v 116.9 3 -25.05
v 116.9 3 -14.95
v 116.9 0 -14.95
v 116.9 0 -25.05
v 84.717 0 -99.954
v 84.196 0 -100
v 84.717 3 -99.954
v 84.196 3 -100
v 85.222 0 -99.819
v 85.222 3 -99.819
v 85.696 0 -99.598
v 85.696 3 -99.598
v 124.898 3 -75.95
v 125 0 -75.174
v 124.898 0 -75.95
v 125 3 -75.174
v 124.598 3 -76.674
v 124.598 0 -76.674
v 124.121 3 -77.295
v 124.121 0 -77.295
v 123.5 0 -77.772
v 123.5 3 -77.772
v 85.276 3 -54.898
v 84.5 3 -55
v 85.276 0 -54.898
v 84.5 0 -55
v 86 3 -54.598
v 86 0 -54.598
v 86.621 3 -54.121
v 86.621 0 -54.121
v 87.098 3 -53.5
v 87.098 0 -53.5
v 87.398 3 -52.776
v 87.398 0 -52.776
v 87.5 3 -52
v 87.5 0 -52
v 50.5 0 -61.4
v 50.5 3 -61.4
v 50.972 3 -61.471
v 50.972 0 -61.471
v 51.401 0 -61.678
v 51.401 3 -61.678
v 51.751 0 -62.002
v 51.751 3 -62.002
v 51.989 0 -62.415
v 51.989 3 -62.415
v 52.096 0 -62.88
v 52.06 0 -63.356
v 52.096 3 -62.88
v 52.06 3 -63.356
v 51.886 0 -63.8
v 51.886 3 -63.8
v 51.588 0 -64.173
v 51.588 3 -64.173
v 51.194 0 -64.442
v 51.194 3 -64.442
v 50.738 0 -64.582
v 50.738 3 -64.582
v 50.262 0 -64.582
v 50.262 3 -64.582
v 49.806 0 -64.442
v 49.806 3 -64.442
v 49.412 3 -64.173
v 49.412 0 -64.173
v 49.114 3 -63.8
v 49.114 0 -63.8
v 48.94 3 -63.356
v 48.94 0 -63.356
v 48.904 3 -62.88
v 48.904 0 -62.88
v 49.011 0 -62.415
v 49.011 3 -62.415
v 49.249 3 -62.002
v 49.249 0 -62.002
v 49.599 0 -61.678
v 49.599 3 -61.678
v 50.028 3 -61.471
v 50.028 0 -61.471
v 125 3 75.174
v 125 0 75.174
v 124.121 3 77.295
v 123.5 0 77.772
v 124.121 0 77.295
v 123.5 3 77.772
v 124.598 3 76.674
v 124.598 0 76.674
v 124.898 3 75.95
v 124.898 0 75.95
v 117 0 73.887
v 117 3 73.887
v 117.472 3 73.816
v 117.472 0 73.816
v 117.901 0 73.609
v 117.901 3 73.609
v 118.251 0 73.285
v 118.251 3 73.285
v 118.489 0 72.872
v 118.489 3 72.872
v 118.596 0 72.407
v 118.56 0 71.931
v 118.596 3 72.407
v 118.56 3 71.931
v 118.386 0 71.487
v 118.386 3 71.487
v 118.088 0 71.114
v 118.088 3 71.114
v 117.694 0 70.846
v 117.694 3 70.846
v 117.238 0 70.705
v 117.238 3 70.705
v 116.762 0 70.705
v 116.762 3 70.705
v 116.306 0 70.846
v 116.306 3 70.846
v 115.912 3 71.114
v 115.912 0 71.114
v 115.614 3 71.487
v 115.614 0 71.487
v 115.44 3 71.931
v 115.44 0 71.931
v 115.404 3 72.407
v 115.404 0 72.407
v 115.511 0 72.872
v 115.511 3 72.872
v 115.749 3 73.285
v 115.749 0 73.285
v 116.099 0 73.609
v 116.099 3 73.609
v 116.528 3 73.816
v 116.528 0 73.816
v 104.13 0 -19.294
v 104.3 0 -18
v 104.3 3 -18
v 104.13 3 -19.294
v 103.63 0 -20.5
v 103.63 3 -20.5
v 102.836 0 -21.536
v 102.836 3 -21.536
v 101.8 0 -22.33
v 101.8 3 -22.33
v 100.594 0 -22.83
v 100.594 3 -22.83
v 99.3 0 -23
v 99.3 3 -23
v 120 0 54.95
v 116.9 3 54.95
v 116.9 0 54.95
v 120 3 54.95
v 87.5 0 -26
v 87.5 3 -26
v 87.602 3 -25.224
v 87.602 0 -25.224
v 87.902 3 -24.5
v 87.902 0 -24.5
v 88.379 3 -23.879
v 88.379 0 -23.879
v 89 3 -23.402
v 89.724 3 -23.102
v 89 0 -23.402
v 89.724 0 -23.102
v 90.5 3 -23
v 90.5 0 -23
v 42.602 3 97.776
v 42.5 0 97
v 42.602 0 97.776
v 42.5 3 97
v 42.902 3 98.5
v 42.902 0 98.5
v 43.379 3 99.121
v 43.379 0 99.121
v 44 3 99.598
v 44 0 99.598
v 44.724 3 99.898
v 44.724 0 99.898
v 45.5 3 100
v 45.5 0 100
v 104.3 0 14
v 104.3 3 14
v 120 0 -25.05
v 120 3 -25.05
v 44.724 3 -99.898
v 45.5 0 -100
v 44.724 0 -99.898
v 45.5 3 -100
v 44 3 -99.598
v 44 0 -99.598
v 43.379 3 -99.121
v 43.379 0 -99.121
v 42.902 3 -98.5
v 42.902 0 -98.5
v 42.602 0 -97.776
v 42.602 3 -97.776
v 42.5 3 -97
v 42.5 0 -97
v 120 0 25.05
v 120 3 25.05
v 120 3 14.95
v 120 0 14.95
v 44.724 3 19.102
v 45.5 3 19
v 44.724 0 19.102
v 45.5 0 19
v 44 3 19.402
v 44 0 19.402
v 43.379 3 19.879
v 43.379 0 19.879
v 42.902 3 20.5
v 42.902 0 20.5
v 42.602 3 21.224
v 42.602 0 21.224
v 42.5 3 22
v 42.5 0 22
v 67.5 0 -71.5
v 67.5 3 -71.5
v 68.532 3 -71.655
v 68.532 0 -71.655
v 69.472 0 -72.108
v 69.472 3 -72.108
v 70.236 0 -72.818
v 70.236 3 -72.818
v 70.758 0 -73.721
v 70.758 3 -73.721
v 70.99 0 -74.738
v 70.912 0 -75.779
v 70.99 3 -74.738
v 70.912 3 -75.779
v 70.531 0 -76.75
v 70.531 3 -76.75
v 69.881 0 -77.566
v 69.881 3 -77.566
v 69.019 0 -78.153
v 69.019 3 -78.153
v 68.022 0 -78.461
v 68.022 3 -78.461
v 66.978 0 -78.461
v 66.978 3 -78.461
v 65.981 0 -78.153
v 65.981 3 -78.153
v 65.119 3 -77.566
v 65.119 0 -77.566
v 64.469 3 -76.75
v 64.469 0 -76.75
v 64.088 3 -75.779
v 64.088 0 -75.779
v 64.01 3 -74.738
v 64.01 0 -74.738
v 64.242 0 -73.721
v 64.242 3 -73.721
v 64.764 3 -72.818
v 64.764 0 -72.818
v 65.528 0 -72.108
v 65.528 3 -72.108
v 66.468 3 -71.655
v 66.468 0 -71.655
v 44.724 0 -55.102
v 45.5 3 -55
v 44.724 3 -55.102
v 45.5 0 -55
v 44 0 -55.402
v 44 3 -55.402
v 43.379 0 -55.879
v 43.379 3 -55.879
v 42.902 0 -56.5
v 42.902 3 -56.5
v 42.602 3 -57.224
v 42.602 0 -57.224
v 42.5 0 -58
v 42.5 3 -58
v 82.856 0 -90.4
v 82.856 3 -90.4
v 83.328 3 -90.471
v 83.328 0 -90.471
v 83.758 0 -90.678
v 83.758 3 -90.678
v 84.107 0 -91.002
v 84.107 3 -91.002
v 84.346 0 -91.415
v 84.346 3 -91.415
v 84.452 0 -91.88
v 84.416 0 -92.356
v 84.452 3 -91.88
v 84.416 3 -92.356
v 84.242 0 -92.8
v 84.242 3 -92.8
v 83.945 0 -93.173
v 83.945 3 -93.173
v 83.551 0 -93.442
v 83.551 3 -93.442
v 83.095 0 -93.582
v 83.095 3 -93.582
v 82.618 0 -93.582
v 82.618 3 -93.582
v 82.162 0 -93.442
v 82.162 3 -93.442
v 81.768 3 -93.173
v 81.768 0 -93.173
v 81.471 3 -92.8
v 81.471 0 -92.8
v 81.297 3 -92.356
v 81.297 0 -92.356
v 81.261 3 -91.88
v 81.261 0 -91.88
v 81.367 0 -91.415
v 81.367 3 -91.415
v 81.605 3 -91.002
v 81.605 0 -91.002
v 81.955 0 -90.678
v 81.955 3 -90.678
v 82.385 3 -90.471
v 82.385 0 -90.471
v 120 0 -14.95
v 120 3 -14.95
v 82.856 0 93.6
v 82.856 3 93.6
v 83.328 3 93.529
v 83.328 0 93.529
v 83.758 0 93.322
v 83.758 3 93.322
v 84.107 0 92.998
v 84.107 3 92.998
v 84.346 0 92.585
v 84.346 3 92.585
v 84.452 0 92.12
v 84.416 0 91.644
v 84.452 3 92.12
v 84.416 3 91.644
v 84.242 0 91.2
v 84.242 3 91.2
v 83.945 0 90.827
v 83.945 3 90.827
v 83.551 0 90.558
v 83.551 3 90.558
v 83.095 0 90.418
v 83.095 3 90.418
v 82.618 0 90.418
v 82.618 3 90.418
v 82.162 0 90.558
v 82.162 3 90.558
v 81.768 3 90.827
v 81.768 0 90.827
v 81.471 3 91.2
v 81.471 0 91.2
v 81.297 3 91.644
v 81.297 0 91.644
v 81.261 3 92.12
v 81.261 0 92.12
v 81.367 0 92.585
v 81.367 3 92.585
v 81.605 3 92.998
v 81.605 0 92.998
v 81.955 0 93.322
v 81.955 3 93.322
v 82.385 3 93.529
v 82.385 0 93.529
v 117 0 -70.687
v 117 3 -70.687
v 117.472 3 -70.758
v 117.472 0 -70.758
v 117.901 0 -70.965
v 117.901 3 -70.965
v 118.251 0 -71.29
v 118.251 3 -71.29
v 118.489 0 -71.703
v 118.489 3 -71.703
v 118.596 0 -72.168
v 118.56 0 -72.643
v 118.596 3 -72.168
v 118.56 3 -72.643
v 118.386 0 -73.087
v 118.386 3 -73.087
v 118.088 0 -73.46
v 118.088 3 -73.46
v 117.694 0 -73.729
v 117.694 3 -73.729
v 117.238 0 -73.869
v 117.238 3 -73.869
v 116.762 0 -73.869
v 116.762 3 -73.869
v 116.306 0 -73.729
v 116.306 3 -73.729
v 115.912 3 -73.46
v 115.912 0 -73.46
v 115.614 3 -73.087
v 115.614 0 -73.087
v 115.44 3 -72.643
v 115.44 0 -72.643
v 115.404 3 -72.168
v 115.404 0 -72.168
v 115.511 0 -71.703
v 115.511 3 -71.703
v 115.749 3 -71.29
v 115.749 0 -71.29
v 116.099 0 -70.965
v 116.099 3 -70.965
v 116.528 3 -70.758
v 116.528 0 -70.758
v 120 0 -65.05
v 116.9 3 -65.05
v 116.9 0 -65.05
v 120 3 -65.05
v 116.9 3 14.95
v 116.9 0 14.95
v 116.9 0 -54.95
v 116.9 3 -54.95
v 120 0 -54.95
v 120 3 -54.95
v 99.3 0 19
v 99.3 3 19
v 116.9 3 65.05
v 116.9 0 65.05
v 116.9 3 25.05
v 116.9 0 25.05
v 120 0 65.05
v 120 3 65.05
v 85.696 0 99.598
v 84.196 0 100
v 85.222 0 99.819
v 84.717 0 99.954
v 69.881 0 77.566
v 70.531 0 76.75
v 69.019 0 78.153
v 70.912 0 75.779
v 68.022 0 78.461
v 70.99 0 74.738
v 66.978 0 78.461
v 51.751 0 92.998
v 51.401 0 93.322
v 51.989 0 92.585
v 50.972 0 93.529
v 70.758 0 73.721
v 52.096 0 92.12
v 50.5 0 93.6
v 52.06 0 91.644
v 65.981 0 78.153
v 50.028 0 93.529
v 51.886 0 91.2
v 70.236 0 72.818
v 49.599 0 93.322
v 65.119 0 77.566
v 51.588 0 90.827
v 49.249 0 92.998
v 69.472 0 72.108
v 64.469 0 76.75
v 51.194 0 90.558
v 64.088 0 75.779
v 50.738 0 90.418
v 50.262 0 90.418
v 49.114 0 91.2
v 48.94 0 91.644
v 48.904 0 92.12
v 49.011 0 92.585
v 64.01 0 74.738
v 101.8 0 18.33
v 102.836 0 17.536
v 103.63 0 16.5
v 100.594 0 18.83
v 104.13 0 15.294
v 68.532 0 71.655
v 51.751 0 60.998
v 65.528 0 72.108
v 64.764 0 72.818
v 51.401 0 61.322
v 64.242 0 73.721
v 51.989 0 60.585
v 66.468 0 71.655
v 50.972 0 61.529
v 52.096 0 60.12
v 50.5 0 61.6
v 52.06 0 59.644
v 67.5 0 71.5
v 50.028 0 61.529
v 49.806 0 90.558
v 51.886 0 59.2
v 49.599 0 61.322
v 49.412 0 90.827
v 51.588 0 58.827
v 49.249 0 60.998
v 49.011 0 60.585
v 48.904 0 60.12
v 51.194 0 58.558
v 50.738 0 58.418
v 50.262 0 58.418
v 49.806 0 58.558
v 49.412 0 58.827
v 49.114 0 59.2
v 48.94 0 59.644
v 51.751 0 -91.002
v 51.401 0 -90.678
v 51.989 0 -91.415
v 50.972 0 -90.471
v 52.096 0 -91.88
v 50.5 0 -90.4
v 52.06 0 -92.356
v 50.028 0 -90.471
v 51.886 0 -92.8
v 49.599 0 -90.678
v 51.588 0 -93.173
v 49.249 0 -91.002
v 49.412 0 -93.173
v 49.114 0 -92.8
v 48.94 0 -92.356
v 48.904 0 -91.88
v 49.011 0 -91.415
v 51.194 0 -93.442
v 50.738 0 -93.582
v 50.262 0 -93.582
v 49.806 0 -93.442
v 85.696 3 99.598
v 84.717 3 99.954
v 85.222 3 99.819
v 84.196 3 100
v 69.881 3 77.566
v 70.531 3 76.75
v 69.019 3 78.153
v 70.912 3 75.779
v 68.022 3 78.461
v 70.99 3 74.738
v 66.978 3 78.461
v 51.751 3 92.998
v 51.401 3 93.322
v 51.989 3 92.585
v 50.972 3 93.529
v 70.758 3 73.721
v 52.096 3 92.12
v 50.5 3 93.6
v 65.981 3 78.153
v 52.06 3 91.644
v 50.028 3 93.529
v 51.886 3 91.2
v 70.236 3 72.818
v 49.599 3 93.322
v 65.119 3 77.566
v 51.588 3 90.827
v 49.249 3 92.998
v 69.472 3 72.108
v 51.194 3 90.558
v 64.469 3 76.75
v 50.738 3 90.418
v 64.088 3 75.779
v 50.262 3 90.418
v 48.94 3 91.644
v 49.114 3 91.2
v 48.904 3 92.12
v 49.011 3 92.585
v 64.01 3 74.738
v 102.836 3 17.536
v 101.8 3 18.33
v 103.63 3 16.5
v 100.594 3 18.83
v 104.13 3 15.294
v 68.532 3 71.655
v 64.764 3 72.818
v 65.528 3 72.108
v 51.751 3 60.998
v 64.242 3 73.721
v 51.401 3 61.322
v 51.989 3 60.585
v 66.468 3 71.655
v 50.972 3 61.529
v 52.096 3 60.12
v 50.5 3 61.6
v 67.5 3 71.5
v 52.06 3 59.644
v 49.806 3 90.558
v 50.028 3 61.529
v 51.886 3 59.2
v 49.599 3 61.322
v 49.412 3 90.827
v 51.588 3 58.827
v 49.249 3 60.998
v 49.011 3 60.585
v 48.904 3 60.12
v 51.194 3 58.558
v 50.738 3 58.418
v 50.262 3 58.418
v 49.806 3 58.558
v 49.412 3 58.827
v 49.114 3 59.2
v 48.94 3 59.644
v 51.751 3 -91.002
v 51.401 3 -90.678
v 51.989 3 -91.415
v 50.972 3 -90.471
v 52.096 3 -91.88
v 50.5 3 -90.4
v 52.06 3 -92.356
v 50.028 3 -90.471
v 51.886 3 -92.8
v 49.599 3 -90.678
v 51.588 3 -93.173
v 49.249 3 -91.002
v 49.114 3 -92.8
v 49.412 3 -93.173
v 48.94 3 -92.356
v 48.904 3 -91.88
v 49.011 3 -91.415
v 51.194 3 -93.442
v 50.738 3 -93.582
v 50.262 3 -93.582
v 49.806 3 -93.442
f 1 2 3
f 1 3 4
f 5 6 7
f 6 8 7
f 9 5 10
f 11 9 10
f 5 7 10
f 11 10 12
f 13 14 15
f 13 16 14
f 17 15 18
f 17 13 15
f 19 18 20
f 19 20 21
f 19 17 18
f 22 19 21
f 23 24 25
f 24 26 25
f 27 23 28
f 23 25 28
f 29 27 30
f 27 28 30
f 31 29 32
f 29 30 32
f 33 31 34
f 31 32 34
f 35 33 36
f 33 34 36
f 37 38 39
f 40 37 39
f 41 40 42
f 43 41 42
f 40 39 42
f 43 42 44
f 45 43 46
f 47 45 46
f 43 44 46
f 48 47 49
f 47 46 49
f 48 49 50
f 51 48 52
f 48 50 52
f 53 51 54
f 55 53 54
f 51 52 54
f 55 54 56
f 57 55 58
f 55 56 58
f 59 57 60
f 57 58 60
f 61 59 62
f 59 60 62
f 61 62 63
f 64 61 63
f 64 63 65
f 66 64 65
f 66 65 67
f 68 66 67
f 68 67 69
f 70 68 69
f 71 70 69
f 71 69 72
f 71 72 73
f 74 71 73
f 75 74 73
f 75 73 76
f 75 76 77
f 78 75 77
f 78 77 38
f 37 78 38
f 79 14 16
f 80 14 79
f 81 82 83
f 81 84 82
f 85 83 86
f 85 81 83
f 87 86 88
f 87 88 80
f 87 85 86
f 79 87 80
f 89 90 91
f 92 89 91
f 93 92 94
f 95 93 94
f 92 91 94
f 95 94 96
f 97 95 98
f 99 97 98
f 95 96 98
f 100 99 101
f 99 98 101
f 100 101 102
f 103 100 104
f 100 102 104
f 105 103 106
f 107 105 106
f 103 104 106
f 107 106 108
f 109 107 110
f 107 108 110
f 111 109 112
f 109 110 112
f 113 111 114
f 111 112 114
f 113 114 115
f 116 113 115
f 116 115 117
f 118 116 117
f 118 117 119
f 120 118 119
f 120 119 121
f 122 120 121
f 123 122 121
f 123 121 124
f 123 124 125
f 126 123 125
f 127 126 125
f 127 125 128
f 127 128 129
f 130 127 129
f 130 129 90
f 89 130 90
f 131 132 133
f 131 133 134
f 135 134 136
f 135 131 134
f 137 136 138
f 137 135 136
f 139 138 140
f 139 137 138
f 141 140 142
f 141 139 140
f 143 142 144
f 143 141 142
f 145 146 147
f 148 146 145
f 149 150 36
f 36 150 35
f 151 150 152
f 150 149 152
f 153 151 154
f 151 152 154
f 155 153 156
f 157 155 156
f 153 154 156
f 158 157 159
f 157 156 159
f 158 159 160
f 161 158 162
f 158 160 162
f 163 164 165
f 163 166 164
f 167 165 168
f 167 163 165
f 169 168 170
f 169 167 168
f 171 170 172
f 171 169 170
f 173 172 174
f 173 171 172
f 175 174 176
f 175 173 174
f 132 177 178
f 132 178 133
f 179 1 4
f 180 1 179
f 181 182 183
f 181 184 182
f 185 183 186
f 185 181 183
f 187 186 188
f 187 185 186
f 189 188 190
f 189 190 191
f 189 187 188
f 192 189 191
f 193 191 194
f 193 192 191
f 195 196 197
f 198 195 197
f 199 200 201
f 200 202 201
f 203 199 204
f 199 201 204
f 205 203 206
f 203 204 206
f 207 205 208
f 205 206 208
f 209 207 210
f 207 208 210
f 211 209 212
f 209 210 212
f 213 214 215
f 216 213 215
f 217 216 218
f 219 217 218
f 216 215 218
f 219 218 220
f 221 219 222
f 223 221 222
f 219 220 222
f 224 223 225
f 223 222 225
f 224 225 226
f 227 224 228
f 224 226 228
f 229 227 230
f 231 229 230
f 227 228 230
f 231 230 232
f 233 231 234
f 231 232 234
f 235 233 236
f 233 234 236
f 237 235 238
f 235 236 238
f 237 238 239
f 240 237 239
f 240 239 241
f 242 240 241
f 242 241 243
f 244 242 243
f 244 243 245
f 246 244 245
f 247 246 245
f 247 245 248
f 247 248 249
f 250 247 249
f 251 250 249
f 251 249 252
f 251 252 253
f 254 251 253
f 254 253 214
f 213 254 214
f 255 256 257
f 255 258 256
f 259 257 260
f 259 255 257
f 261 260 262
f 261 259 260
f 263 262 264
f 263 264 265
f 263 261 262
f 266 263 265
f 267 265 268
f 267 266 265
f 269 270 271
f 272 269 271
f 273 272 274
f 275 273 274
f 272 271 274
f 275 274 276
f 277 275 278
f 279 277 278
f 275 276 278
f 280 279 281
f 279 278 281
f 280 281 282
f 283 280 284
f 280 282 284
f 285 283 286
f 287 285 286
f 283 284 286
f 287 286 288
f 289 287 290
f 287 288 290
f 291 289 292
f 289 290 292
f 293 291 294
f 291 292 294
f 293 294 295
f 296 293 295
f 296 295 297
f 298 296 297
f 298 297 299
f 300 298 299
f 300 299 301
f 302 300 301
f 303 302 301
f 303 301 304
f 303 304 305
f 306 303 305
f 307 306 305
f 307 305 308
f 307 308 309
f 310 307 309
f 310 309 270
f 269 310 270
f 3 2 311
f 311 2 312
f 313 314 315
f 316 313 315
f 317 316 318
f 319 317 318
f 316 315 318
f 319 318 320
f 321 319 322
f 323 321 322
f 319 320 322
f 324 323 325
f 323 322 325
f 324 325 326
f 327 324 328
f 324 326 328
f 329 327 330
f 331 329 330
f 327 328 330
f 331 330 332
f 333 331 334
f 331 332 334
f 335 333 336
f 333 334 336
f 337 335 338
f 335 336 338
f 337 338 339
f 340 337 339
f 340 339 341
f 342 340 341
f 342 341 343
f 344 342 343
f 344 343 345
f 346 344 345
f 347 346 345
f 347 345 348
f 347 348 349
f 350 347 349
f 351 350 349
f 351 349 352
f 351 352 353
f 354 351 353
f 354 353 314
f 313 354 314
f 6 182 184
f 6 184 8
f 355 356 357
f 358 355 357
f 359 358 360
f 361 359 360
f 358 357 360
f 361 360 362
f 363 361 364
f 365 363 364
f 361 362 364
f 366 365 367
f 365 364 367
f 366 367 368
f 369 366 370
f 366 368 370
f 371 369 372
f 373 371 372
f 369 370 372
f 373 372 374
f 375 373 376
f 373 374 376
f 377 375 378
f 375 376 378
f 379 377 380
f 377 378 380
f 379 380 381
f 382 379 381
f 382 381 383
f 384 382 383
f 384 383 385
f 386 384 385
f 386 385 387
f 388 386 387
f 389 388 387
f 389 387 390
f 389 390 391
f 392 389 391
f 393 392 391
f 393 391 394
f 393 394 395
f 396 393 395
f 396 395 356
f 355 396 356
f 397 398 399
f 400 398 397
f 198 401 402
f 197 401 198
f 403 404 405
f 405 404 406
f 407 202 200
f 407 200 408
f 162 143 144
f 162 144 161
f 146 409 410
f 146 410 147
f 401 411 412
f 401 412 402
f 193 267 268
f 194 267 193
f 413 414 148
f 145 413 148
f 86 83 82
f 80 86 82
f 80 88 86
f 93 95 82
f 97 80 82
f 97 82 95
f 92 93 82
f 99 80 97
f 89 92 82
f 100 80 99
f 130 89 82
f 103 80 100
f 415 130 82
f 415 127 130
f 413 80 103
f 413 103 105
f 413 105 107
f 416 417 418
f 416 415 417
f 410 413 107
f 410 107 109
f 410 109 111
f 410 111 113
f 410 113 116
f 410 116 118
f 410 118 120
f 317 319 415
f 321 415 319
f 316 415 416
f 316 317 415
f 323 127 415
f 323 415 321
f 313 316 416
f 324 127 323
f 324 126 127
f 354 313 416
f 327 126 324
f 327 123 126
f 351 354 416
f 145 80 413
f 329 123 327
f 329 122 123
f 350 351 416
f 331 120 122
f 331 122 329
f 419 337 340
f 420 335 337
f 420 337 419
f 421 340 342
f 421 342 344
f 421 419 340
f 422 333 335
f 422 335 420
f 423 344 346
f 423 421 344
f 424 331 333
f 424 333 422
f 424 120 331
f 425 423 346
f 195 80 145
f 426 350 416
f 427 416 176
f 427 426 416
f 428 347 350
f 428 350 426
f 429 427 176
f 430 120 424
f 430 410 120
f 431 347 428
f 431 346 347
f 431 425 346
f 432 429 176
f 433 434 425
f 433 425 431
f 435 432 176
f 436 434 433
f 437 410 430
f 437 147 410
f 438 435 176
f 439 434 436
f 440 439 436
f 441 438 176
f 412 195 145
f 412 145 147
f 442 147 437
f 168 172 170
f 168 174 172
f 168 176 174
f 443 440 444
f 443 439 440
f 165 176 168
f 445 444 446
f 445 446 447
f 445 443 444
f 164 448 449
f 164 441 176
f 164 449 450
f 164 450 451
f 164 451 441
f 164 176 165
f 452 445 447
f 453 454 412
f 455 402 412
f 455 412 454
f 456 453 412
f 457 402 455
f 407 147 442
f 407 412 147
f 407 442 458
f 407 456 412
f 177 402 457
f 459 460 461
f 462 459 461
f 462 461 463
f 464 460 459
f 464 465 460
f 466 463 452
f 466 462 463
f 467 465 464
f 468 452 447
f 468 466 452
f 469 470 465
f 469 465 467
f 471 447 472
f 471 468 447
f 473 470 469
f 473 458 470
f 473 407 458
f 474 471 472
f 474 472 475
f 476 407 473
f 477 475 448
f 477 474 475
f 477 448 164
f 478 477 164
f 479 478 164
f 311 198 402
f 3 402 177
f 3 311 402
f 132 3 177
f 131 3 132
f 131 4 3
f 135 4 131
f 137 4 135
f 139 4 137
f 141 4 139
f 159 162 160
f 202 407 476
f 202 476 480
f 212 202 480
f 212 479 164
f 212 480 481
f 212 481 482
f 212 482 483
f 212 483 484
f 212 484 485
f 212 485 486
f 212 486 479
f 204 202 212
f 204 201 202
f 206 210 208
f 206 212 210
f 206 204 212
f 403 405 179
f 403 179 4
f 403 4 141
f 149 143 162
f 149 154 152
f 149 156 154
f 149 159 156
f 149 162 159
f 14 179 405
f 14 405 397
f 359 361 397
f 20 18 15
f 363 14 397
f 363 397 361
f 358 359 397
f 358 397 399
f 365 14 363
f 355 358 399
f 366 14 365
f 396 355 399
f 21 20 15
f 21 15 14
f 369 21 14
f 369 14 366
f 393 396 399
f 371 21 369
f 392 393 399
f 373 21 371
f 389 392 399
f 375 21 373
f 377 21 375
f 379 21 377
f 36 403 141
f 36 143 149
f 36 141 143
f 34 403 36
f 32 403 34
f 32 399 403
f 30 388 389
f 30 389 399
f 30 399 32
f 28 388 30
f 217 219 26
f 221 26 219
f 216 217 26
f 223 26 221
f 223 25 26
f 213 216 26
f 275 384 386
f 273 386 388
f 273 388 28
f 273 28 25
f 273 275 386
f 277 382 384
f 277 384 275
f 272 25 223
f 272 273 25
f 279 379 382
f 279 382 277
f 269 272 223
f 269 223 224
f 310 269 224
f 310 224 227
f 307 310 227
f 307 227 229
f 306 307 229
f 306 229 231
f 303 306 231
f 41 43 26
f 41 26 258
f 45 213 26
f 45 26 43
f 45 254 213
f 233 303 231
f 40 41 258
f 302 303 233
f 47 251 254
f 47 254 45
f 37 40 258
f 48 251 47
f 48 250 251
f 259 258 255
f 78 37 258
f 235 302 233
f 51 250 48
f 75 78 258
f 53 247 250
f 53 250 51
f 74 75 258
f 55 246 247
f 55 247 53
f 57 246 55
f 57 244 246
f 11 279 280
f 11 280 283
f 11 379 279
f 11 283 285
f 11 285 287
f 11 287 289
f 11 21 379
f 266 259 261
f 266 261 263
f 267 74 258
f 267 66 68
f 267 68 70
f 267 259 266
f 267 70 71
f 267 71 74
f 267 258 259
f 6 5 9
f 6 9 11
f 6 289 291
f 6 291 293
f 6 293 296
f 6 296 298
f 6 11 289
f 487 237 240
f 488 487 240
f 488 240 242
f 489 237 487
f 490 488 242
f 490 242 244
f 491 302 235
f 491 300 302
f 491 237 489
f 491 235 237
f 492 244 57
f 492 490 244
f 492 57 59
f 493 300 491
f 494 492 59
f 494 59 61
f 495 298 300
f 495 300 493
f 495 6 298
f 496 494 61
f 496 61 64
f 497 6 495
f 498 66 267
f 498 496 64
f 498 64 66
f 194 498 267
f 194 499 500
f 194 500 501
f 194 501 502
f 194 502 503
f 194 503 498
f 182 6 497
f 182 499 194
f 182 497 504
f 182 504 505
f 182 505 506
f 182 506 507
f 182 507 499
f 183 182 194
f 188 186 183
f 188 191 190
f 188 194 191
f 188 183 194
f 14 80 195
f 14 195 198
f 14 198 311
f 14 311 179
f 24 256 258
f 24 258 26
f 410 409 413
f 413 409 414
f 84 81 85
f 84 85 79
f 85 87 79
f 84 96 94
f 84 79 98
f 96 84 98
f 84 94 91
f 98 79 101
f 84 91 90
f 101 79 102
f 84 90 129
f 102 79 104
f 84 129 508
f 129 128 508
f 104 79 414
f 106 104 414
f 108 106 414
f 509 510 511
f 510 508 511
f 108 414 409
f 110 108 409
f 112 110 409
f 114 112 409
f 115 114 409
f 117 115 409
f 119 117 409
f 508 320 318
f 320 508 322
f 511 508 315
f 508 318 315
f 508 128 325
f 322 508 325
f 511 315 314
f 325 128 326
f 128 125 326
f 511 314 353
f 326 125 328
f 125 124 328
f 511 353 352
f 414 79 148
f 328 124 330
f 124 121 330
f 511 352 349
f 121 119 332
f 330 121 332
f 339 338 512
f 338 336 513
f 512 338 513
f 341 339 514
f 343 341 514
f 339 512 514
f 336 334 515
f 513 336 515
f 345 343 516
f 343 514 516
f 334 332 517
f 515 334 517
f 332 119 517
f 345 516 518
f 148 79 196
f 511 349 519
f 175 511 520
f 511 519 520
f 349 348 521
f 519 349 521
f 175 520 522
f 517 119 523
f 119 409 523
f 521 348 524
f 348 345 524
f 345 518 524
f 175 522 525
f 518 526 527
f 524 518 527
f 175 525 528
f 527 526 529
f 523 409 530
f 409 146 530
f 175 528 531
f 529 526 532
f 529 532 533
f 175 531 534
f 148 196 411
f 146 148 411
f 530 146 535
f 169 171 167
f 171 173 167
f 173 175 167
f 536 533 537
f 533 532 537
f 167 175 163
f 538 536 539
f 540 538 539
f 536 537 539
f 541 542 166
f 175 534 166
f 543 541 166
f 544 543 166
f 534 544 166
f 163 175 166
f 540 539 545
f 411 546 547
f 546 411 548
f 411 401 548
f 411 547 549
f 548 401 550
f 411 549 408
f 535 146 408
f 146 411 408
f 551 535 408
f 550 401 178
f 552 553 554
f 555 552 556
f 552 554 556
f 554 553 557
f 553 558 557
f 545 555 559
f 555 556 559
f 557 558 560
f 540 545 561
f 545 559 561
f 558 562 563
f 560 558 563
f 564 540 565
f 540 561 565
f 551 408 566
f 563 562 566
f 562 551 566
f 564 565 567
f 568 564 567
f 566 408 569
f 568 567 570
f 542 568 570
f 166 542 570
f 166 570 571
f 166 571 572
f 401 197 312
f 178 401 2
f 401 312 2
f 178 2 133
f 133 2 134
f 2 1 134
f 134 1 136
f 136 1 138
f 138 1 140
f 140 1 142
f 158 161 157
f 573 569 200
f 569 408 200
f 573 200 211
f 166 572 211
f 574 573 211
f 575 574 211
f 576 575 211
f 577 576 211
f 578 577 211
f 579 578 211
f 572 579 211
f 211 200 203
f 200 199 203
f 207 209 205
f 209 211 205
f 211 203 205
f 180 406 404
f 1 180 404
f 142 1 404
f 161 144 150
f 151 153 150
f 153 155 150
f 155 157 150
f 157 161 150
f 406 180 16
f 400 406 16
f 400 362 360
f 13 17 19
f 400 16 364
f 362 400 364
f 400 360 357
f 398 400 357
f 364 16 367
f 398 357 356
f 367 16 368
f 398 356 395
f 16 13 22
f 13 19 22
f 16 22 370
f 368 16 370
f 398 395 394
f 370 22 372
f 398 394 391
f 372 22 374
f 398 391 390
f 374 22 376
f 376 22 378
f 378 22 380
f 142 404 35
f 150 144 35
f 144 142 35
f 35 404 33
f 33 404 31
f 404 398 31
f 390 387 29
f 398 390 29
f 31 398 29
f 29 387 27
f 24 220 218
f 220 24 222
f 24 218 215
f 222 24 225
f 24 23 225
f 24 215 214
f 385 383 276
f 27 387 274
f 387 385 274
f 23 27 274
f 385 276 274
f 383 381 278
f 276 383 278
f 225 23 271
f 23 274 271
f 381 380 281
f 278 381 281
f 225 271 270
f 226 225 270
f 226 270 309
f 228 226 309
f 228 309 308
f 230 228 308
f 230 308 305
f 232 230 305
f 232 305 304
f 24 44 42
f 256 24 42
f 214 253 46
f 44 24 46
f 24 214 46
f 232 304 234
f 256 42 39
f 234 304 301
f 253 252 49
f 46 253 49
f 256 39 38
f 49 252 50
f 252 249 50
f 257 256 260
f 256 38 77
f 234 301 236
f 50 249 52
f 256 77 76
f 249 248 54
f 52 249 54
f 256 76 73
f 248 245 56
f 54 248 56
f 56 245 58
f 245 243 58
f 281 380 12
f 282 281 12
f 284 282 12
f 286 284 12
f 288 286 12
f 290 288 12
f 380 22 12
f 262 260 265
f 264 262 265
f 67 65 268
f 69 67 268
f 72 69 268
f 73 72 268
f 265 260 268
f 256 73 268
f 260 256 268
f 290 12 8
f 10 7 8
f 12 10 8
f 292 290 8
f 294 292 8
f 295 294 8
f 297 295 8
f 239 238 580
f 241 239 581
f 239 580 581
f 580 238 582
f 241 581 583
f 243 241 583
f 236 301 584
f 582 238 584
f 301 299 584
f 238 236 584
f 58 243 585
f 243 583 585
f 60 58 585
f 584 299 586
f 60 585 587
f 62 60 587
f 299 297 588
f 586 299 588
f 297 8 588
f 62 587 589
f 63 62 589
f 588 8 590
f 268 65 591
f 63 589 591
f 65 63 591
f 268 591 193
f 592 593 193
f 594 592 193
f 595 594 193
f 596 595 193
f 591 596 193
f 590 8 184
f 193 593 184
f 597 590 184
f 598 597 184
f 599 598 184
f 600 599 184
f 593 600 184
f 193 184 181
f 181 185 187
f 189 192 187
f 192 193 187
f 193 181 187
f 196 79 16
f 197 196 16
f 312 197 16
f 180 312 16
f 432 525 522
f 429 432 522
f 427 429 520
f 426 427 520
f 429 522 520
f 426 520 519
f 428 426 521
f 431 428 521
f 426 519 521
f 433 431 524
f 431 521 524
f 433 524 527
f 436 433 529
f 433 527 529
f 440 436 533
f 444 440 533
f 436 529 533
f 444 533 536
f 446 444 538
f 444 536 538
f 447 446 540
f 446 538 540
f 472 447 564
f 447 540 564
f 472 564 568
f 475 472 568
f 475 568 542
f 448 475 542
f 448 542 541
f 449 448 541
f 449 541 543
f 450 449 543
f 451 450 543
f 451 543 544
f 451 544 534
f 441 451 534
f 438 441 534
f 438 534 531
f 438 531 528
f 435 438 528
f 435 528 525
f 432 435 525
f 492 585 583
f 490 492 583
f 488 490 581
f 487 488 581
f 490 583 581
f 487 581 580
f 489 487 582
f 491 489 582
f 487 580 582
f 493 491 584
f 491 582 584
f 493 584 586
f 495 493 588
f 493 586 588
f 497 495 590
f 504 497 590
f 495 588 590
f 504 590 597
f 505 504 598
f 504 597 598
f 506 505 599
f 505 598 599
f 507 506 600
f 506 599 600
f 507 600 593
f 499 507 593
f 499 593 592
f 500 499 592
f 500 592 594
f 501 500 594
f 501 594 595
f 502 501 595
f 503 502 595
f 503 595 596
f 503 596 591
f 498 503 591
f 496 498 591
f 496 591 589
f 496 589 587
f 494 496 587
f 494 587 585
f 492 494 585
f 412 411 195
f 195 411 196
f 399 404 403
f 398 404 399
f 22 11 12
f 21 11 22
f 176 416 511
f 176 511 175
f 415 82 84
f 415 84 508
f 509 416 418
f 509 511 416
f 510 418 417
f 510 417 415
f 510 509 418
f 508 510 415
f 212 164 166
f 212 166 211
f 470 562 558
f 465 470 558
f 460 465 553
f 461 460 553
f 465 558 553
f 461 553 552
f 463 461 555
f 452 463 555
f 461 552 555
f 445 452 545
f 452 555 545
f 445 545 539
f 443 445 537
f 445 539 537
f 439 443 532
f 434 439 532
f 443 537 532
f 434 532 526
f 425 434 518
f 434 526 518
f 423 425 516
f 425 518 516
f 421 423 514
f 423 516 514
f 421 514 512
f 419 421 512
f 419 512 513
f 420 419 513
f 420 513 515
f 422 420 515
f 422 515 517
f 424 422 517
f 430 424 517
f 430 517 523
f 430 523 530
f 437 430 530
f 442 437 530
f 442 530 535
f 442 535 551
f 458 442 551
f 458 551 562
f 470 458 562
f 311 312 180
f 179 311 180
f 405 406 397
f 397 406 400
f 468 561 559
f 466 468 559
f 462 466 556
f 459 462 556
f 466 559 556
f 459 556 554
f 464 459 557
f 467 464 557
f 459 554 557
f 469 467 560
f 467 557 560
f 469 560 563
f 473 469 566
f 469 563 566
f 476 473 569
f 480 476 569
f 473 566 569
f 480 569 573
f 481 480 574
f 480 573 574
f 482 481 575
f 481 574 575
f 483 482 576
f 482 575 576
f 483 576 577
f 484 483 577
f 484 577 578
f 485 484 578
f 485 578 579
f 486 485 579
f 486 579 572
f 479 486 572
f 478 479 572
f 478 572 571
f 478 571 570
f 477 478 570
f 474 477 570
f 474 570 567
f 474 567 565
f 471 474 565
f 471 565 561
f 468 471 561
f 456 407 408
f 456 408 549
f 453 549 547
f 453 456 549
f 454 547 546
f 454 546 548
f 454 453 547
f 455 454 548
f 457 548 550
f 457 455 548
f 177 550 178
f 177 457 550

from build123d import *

# Parameters (mm, degrees)
BOSS_EXTRUDE1_DEPTH = 3
CUT_EXTRUDE1_REACH  = 162.106
SKETCH2_W           = 45
SKETCH2_H           = 74
FILLET2_R           = 3
SKETCH3_W           = 3.1
SKETCH3_H           = 10.1
CUT_EXTRUDE2_DEPTH  = 161.106214745
CUT_EXTRUDE3_REACH  = 162.106
SKETCH4_R           = 1.6
SKETCH5_R           = 3.5
CUT_EXTRUDE4_DEPTH  = 161.106214745


with BuildPart() as part:
    # Sketch1 → Boss-Extrude1 (new body)
    with BuildSketch(Plane(origin=(0, 0, 0), x_dir=(1, 0, 0), z_dir=(0, 1, 0))):
        Polygon((42.5, 100), (85, 100), (125, 76.905989232), (125, -76.905989232), (85, -100), (42.5, -100), align=None)
        with BuildLine():
            Line((99.3, 23), (67.3, 23))
            ThreePointArc((67.3, 23), (63.764466094, 21.535533906), (62.3, 18))
            Line((62.3, 18), (62.3, -14))
            ThreePointArc((62.3, -14), (63.764466094, -17.535533906), (67.3, -19))
            Line((67.3, -19), (99.3, -19))
            ThreePointArc((99.3, -19), (102.835533906, -17.535533906), (104.3, -14))
            Line((104.3, -14), (104.3, 18))
            ThreePointArc((104.3, 18), (102.835533906, 21.535533906), (99.3, 23))
        make_face(mode=Mode.SUBTRACT)
    extrude(amount=BOSS_EXTRUDE1_DEPTH)

    # Sketch2 → Cut-Extrude1 (cut, up to next)
    with BuildSketch(Plane(origin=(0, 3, 0), x_dir=(1, 0, 0), z_dir=(0, 1, 0)), mode=Mode.PRIVATE) as cut_extrude1_sk1:
        with Locations((65, 18)):
            Rectangle(SKETCH2_W, SKETCH2_H)
    cut_extrude1_tool1 = extrude(cut_extrude1_sk1.sketch, amount=-CUT_EXTRUDE1_REACH, mode=Mode.PRIVATE) & part.part
    add(cut_extrude1_tool1.solids().sort_by_distance((65, 3, -18))[0], mode=Mode.SUBTRACT)

    # Fillet2
    fillet2_edges = [part.edges().sort_by_distance(p)[0] for p in [
        (125, 1.5, -76.905989232),
        (125, 1.5, 76.905989232),
        (85, 1.5, 100),
        (42.5, 1.5, 100),
        (42.5, 1.5, -100),
        (85, 1.5, -100),
        (42.5, 1.5, 19),
        (42.5, 1.5, -55),
        (87.5, 1.5, -23),
        (87.5, 1.5, -55),
    ]]
    fillet(fillet2_edges, radius=FILLET2_R)

    # Sketch3 → Cut-Extrude2 (cut, through all)
    with BuildSketch(Plane(origin=(0, 3, 0), x_dir=(1, 0, 0), z_dir=(0, 1, 0))):
        with Locations((118.45, 20)):
            Rectangle(SKETCH3_W, SKETCH3_H)
        with Locations((118.45, -20)):
            Rectangle(SKETCH3_W, SKETCH3_H)
        with Locations((118.45, 60)):
            Rectangle(SKETCH3_W, SKETCH3_H)
        with Locations((118.45, -60)):
            Rectangle(SKETCH3_W, SKETCH3_H)
    extrude(amount=-CUT_EXTRUDE2_DEPTH, mode=Mode.SUBTRACT)

    # Sketch4 → Cut-Extrude3 (cut, up to next)
    with BuildSketch(Plane(origin=(0, 3, 0), x_dir=(1, 0, 0), z_dir=(0, 1, 0)), mode=Mode.PRIVATE) as cut_extrude3_sk1:
        with Locations(Location((50.5, 92, 0), (0, 0, 270))):
            Circle(SKETCH4_R)
    cut_extrude3_tool1 = extrude(cut_extrude3_sk1.sketch, amount=-CUT_EXTRUDE3_REACH, mode=Mode.PRIVATE) & part.part
    # Sketch4 → Cut-Extrude3 (cut, up to next)
    with BuildSketch(Plane(origin=(0, 3, 0), x_dir=(1, 0, 0), z_dir=(0, 1, 0)), mode=Mode.PRIVATE) as cut_extrude3_sk2:
        with Locations(Location((50.5, 63, 0), (0, 0, 270))):
            Circle(SKETCH4_R)
    cut_extrude3_tool2 = extrude(cut_extrude3_sk2.sketch, amount=-CUT_EXTRUDE3_REACH, mode=Mode.PRIVATE) & part.part
    # Sketch4 → Cut-Extrude3 (cut, up to next)
    with BuildSketch(Plane(origin=(0, 3, 0), x_dir=(1, 0, 0), z_dir=(0, 1, 0)), mode=Mode.PRIVATE) as cut_extrude3_sk3:
        with Locations(Location((50.5, -60, 0), (0, 0, 270))):
            Circle(SKETCH4_R)
    cut_extrude3_tool3 = extrude(cut_extrude3_sk3.sketch, amount=-CUT_EXTRUDE3_REACH, mode=Mode.PRIVATE) & part.part
    # Sketch4 → Cut-Extrude3 (cut, up to next)
    with BuildSketch(Plane(origin=(0, 3, 0), x_dir=(1, 0, 0), z_dir=(0, 1, 0)), mode=Mode.PRIVATE) as cut_extrude3_sk4:
        with Locations(Location((50.5, -92, 0), (0, 0, 270))):
            Circle(SKETCH4_R)
    cut_extrude3_tool4 = extrude(cut_extrude3_sk4.sketch, amount=-CUT_EXTRUDE3_REACH, mode=Mode.PRIVATE) & part.part
    # Sketch4 → Cut-Extrude3 (cut, up to next)
    with BuildSketch(Plane(origin=(0, 3, 0), x_dir=(1, 0, 0), z_dir=(0, 1, 0)), mode=Mode.PRIVATE) as cut_extrude3_sk5:
        with Locations(Location((117, 72.287187079, 0), (0, 0, 270))):
            Circle(SKETCH4_R)
    cut_extrude3_tool5 = extrude(cut_extrude3_sk5.sketch, amount=-CUT_EXTRUDE3_REACH, mode=Mode.PRIVATE) & part.part
    # Sketch4 → Cut-Extrude3 (cut, up to next)
    with BuildSketch(Plane(origin=(0, 3, 0), x_dir=(1, 0, 0), z_dir=(0, 1, 0)), mode=Mode.PRIVATE) as cut_extrude3_sk6:
        with Locations(Location((117, -72.287187079, 0), (0, 0, 270))):
            Circle(SKETCH4_R)
    cut_extrude3_tool6 = extrude(cut_extrude3_sk6.sketch, amount=-CUT_EXTRUDE3_REACH, mode=Mode.PRIVATE) & part.part
    # Sketch4 → Cut-Extrude3 (cut, up to next)
    with BuildSketch(Plane(origin=(0, 3, 0), x_dir=(1, 0, 0), z_dir=(0, 1, 0)), mode=Mode.PRIVATE) as cut_extrude3_sk7:
        with Locations(Location((82.856406461, 92, 0), (0, 0, 270))):
            Circle(SKETCH4_R)
    cut_extrude3_tool7 = extrude(cut_extrude3_sk7.sketch, amount=-CUT_EXTRUDE3_REACH, mode=Mode.PRIVATE) & part.part
    # Sketch4 → Cut-Extrude3 (cut, up to next)
    with BuildSketch(Plane(origin=(0, 3, 0), x_dir=(1, 0, 0), z_dir=(0, 1, 0)), mode=Mode.PRIVATE) as cut_extrude3_sk8:
        with Locations(Location((82.856406461, -92, 0), (0, 0, 270))):
            Circle(SKETCH4_R)
    cut_extrude3_tool8 = extrude(cut_extrude3_sk8.sketch, amount=-CUT_EXTRUDE3_REACH, mode=Mode.PRIVATE) & part.part
    add(cut_extrude3_tool1.solids().sort_by_distance((50.5, 3, -92))[0], mode=Mode.SUBTRACT)
    add(cut_extrude3_tool2.solids().sort_by_distance((50.5, 3, -63))[0], mode=Mode.SUBTRACT)
    add(cut_extrude3_tool3.solids().sort_by_distance((50.5, 3, 60))[0], mode=Mode.SUBTRACT)
    add(cut_extrude3_tool4.solids().sort_by_distance((50.5, 3, 92))[0], mode=Mode.SUBTRACT)
    add(cut_extrude3_tool5.solids().sort_by_distance((117, 3, -72.287187))[0], mode=Mode.SUBTRACT)
    add(cut_extrude3_tool6.solids().sort_by_distance((117, 3, 72.287187))[0], mode=Mode.SUBTRACT)
    add(cut_extrude3_tool7.solids().sort_by_distance((82.856406, 3, -92))[0], mode=Mode.SUBTRACT)
    add(cut_extrude3_tool8.solids().sort_by_distance((82.856406, 3, 92))[0], mode=Mode.SUBTRACT)

    # Sketch5 → Cut-Extrude4 (cut, through all)
    with BuildSketch(Plane(origin=(0, 3, 0), x_dir=(1, 0, 0), z_dir=(0, 1, 0))):
        with Locations(Location((67.5, 75, 0), (0, 0, 270))):
            Circle(SKETCH5_R)
        with Locations(Location((67.5, -75, 0), (0, 0, 90))):
            Circle(SKETCH5_R)
    extrude(amount=-CUT_EXTRUDE4_DEPTH, mode=Mode.SUBTRACT)


solid = part.part
